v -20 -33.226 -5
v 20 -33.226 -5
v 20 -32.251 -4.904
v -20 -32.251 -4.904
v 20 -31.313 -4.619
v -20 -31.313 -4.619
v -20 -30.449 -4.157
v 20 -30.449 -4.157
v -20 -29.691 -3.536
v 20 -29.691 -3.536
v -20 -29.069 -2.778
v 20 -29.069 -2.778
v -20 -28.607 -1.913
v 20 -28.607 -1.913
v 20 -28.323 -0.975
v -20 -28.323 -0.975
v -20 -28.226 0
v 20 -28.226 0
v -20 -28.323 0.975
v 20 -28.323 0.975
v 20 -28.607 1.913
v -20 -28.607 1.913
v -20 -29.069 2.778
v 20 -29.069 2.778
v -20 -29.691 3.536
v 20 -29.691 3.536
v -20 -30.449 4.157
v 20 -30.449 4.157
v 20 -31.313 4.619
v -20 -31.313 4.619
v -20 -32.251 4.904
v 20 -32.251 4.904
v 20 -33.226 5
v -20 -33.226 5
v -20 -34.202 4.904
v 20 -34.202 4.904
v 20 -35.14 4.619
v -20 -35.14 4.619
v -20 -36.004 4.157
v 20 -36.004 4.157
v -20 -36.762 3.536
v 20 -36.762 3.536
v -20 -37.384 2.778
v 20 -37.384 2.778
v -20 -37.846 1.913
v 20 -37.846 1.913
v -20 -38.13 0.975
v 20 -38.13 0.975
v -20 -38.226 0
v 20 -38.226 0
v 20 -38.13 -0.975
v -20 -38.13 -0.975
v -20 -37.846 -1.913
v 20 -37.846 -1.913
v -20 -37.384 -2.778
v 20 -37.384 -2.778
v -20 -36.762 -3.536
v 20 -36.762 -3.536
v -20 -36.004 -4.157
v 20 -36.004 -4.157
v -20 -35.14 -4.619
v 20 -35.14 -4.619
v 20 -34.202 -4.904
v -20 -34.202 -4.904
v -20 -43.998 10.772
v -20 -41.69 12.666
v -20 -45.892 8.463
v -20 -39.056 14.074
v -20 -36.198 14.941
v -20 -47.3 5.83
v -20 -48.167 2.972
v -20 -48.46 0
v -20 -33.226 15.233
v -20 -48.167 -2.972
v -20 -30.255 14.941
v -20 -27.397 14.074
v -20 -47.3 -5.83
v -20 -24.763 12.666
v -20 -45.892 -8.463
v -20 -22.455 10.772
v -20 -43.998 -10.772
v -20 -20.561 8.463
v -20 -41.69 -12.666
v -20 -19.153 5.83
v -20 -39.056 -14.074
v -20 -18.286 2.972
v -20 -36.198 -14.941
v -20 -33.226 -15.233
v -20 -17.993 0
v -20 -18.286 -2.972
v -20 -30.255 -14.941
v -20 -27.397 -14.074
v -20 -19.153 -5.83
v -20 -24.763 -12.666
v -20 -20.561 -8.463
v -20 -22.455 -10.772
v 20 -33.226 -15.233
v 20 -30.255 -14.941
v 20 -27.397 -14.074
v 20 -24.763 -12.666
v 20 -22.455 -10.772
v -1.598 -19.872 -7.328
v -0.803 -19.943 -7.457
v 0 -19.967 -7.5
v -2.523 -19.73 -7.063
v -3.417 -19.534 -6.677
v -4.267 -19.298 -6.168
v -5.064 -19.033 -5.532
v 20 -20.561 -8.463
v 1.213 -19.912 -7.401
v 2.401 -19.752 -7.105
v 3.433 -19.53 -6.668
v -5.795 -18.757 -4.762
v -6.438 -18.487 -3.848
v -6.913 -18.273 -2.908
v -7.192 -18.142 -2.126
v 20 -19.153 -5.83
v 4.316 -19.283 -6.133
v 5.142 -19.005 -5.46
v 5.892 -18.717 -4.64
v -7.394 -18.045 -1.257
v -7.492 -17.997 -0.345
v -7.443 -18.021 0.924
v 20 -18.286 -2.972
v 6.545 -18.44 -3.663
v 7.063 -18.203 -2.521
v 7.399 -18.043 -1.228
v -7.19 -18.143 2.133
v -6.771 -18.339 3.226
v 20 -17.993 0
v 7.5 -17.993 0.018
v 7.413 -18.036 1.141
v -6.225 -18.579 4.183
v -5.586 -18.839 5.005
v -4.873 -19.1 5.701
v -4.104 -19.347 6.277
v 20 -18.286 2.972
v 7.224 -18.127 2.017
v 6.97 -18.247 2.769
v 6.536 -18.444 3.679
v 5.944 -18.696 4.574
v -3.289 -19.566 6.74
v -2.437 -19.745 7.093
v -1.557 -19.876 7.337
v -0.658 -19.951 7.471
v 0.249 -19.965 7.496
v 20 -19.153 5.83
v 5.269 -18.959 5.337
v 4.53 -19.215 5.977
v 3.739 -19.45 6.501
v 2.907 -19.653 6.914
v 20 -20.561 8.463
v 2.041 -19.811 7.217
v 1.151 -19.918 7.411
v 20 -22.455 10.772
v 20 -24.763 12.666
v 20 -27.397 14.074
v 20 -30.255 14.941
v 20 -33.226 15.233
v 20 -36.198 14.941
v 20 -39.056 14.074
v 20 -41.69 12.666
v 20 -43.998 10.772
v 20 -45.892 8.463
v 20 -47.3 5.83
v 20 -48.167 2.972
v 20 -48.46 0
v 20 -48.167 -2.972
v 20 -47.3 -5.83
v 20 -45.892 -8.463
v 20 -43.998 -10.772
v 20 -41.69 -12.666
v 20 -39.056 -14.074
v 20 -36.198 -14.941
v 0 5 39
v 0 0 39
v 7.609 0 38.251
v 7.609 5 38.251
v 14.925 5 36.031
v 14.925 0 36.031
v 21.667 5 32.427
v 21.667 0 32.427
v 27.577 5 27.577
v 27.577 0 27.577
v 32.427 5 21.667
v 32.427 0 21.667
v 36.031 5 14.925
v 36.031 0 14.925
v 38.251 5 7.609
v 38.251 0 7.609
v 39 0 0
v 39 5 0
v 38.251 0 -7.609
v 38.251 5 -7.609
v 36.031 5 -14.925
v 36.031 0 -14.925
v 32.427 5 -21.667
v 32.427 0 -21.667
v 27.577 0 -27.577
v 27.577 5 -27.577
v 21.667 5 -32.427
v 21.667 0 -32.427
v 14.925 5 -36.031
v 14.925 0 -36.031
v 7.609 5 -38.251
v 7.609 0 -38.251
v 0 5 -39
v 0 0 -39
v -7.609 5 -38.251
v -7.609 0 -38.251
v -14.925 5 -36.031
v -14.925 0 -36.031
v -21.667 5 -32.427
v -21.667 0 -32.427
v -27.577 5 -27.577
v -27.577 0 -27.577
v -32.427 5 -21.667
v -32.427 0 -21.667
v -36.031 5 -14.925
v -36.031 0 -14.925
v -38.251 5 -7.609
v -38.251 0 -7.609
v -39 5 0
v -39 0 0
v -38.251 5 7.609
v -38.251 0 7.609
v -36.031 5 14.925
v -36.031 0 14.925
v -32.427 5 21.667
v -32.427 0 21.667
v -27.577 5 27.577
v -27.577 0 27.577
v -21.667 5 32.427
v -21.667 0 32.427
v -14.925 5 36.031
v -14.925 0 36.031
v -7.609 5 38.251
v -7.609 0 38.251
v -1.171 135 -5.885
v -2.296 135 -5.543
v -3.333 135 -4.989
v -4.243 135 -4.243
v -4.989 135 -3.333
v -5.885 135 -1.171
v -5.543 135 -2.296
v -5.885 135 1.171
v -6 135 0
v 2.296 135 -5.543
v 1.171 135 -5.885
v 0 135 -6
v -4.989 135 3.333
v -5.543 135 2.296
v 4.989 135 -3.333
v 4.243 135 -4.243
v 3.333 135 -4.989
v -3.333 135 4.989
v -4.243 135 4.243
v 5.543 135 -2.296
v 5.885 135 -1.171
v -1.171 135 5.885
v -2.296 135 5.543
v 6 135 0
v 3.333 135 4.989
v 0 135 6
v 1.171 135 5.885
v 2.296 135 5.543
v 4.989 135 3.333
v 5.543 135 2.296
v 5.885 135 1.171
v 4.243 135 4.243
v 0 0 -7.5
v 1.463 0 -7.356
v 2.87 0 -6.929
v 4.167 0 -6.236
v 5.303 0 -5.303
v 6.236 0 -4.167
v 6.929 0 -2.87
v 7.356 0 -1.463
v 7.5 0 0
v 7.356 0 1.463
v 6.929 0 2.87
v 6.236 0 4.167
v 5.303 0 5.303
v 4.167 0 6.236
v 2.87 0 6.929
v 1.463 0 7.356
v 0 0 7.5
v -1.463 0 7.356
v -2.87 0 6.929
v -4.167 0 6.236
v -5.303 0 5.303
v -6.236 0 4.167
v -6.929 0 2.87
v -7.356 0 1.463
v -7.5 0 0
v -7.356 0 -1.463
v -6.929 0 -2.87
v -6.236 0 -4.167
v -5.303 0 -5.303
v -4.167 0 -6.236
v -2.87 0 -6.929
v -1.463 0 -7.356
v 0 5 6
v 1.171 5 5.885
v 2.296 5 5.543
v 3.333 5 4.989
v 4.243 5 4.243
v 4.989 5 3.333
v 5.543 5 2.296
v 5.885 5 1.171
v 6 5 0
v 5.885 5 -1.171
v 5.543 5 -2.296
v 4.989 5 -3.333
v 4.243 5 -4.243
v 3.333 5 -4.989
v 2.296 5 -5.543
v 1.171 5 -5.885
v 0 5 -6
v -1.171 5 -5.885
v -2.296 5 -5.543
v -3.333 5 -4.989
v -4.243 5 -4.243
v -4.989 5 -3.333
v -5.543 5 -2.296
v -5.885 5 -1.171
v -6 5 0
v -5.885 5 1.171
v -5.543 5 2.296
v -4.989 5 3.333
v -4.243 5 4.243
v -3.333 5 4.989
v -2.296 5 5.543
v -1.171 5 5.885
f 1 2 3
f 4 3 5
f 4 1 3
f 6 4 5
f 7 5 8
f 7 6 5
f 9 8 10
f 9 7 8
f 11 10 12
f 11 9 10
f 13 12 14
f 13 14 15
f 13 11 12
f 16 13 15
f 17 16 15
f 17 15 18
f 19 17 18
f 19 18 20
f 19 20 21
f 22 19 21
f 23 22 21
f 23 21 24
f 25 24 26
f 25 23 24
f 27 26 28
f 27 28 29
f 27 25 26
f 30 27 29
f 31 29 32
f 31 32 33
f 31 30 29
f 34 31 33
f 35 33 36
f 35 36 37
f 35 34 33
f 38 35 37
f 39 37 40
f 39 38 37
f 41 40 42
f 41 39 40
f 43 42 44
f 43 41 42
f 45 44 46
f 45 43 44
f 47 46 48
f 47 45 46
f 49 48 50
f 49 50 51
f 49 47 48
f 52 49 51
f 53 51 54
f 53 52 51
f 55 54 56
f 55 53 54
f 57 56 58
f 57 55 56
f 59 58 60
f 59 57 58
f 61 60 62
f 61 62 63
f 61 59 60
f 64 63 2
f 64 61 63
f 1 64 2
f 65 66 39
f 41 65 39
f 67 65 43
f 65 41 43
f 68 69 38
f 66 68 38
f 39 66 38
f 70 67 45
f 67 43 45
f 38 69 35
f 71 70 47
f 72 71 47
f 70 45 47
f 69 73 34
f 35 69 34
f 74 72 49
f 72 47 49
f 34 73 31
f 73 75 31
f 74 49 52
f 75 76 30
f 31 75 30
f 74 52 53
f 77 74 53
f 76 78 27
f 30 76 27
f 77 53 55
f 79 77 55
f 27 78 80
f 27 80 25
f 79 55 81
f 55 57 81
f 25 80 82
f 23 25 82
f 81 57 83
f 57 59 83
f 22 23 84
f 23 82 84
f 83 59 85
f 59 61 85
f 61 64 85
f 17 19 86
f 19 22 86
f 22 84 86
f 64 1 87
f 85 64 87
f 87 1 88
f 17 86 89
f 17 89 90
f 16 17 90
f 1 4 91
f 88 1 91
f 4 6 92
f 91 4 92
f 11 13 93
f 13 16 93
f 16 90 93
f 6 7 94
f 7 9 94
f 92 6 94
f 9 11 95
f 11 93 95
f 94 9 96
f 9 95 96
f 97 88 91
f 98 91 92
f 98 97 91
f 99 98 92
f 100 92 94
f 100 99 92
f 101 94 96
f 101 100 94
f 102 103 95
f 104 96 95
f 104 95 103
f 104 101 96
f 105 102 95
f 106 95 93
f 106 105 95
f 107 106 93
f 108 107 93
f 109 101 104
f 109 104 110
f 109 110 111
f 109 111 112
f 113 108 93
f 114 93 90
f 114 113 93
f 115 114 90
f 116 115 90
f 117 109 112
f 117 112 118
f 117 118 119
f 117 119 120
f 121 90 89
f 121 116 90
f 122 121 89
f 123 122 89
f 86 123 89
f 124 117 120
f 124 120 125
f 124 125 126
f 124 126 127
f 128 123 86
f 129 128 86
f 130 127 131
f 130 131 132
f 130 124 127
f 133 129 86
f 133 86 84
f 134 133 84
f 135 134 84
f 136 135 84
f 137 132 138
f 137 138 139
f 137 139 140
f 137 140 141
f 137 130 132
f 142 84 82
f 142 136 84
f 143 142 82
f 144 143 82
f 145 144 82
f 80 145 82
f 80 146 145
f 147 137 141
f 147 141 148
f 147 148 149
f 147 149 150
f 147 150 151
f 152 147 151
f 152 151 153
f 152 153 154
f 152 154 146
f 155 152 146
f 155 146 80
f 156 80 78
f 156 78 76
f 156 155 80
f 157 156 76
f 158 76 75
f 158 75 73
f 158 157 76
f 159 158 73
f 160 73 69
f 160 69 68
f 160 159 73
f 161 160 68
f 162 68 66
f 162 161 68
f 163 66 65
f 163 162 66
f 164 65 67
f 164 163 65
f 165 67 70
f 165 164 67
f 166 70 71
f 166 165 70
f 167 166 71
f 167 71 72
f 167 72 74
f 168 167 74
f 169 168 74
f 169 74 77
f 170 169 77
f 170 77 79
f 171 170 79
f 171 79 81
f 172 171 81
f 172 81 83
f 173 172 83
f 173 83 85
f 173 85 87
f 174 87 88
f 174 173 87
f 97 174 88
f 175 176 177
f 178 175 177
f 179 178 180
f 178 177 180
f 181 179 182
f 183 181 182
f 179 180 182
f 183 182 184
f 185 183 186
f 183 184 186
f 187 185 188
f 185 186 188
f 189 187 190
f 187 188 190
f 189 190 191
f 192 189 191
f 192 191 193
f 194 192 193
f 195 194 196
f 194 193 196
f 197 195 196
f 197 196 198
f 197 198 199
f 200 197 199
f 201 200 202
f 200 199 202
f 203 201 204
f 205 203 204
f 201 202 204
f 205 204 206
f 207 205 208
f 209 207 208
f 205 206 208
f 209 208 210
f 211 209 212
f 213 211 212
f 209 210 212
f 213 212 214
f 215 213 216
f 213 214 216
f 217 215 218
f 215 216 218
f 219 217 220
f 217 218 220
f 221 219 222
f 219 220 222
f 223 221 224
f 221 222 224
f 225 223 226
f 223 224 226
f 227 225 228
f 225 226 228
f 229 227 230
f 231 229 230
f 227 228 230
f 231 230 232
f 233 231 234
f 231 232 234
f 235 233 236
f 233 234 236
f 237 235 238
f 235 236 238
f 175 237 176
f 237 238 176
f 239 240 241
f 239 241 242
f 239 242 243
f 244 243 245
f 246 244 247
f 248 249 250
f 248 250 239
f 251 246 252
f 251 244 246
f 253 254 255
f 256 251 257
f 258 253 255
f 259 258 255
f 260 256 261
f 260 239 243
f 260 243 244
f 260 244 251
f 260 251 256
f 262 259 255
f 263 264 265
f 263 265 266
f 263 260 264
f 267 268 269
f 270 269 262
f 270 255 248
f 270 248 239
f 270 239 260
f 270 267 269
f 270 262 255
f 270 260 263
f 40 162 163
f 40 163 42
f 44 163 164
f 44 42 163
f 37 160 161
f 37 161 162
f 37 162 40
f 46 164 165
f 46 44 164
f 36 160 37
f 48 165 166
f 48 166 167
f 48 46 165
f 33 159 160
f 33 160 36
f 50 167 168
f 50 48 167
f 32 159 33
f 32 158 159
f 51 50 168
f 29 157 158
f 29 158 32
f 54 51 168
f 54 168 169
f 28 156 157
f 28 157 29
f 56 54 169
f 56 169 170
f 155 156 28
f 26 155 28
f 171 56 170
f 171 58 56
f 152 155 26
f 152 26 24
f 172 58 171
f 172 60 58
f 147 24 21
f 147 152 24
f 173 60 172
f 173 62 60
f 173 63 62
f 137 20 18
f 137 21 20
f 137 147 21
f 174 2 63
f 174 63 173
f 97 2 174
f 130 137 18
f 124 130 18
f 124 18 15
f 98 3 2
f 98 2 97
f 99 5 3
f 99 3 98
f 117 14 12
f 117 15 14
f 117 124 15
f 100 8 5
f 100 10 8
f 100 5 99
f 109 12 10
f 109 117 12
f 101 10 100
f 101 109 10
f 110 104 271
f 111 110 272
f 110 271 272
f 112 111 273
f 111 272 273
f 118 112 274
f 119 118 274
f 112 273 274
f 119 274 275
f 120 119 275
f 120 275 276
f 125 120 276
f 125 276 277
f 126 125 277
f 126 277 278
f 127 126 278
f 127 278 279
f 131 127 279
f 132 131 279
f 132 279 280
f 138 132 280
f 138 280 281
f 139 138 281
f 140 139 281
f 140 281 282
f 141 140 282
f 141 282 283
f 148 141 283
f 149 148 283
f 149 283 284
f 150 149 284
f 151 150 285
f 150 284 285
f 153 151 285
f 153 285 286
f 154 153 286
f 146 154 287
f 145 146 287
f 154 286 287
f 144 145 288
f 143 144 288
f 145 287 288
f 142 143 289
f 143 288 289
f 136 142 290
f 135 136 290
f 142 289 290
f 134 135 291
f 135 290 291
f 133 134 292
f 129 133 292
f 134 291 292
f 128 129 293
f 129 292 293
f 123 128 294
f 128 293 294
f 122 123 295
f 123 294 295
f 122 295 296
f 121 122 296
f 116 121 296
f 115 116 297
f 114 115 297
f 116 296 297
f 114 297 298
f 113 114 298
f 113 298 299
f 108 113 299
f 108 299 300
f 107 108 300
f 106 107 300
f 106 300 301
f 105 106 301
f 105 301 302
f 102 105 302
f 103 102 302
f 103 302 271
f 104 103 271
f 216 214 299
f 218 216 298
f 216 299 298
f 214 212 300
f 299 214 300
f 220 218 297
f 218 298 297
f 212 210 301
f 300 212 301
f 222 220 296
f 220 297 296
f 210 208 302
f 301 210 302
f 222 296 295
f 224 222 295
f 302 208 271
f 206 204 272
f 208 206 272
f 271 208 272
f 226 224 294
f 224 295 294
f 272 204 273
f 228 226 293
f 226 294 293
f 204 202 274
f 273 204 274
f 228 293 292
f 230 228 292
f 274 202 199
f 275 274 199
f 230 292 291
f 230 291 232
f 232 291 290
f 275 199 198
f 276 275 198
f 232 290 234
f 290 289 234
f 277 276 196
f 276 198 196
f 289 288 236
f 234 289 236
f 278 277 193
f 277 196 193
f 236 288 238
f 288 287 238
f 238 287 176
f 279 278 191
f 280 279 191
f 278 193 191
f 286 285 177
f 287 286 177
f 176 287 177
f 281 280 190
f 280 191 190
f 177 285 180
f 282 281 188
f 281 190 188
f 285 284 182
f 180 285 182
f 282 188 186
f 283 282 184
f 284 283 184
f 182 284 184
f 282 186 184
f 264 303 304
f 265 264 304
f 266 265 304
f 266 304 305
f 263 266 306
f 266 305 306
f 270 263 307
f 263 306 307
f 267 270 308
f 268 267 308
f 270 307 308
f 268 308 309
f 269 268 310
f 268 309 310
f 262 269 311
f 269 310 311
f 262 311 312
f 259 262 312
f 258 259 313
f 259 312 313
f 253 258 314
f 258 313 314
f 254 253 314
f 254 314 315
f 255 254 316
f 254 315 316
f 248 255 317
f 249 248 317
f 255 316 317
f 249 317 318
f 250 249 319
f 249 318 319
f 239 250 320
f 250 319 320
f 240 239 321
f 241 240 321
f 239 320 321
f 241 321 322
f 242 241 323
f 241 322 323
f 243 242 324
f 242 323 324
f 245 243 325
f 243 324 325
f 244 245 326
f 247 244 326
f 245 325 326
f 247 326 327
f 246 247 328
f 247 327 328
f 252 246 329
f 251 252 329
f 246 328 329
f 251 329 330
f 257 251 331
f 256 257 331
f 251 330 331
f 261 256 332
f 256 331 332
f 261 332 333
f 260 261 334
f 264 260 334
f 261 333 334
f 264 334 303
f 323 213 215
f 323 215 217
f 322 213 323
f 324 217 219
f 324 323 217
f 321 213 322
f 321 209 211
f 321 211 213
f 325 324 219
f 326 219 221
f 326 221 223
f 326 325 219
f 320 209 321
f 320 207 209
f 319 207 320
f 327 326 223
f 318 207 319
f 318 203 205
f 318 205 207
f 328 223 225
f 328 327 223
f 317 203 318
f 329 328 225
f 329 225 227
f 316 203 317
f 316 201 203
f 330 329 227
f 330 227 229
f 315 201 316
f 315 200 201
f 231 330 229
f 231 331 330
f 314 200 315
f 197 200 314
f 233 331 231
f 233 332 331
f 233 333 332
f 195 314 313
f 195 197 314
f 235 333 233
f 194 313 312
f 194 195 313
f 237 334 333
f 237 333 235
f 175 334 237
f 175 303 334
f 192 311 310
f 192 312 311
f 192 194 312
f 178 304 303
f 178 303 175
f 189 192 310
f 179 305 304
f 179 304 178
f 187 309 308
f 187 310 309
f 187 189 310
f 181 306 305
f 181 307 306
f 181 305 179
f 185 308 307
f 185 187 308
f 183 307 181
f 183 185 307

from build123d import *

# Parameters (mm, degrees)
SKETCH4_R           = 39
BOSS_EXTRUDE2_DEPTH = 5
SKETCH5_R           = 6
BOSS_EXTRUDE3_DEPTH = 130
SKETCH6_R           = 7.5
BOSS_EXTRUDE4_DEPTH = 20
SKETCH8_R           = 15.233231967
SKETCH8_R_2         = 5
BOSS_EXTRUDE5_DEPTH = 20


with BuildPart() as part:
    # Sketch4 → Boss-Extrude2 (new body)
    with BuildSketch(Plane(origin=(0, 0, 0), x_dir=(1, 0, 0), z_dir=(0, 1, 0))):
        with Locations(Location((0, 0, 0), (0, 0, 270))):
            Circle(SKETCH4_R)
    extrude(amount=BOSS_EXTRUDE2_DEPTH)

    # Sketch5 → Boss-Extrude3 (add)
    with BuildSketch(Plane(origin=(0, 5, 0), x_dir=(1, 0, 0), z_dir=(0, 1, 0))):
        with Locations(Location((0, 0, 0), (0, 0, 270))):
            Circle(SKETCH5_R)
    extrude(amount=BOSS_EXTRUDE3_DEPTH)

    # Sketch6 → Boss-Extrude4 (add)
    with BuildSketch(Plane.XZ):
        with Locations(Location((0, 0, 0), (0, 0, 270))):
            Circle(SKETCH6_R)
    extrude(amount=BOSS_EXTRUDE4_DEPTH)

    # Sketch8 → Boss-Extrude5 (add, symmetric)
    with BuildSketch(Plane(origin=(0, 0, 0), x_dir=(0, 0, -1), z_dir=(1, 0, 0))):
        with Locations((0, -33.226479946)):
            Circle(SKETCH8_R)
        with Locations((0, -33.226479946)):
            Circle(SKETCH8_R_2, mode=Mode.SUBTRACT)
    extrude(amount=BOSS_EXTRUDE5_DEPTH, both=True)


solid = part.part
